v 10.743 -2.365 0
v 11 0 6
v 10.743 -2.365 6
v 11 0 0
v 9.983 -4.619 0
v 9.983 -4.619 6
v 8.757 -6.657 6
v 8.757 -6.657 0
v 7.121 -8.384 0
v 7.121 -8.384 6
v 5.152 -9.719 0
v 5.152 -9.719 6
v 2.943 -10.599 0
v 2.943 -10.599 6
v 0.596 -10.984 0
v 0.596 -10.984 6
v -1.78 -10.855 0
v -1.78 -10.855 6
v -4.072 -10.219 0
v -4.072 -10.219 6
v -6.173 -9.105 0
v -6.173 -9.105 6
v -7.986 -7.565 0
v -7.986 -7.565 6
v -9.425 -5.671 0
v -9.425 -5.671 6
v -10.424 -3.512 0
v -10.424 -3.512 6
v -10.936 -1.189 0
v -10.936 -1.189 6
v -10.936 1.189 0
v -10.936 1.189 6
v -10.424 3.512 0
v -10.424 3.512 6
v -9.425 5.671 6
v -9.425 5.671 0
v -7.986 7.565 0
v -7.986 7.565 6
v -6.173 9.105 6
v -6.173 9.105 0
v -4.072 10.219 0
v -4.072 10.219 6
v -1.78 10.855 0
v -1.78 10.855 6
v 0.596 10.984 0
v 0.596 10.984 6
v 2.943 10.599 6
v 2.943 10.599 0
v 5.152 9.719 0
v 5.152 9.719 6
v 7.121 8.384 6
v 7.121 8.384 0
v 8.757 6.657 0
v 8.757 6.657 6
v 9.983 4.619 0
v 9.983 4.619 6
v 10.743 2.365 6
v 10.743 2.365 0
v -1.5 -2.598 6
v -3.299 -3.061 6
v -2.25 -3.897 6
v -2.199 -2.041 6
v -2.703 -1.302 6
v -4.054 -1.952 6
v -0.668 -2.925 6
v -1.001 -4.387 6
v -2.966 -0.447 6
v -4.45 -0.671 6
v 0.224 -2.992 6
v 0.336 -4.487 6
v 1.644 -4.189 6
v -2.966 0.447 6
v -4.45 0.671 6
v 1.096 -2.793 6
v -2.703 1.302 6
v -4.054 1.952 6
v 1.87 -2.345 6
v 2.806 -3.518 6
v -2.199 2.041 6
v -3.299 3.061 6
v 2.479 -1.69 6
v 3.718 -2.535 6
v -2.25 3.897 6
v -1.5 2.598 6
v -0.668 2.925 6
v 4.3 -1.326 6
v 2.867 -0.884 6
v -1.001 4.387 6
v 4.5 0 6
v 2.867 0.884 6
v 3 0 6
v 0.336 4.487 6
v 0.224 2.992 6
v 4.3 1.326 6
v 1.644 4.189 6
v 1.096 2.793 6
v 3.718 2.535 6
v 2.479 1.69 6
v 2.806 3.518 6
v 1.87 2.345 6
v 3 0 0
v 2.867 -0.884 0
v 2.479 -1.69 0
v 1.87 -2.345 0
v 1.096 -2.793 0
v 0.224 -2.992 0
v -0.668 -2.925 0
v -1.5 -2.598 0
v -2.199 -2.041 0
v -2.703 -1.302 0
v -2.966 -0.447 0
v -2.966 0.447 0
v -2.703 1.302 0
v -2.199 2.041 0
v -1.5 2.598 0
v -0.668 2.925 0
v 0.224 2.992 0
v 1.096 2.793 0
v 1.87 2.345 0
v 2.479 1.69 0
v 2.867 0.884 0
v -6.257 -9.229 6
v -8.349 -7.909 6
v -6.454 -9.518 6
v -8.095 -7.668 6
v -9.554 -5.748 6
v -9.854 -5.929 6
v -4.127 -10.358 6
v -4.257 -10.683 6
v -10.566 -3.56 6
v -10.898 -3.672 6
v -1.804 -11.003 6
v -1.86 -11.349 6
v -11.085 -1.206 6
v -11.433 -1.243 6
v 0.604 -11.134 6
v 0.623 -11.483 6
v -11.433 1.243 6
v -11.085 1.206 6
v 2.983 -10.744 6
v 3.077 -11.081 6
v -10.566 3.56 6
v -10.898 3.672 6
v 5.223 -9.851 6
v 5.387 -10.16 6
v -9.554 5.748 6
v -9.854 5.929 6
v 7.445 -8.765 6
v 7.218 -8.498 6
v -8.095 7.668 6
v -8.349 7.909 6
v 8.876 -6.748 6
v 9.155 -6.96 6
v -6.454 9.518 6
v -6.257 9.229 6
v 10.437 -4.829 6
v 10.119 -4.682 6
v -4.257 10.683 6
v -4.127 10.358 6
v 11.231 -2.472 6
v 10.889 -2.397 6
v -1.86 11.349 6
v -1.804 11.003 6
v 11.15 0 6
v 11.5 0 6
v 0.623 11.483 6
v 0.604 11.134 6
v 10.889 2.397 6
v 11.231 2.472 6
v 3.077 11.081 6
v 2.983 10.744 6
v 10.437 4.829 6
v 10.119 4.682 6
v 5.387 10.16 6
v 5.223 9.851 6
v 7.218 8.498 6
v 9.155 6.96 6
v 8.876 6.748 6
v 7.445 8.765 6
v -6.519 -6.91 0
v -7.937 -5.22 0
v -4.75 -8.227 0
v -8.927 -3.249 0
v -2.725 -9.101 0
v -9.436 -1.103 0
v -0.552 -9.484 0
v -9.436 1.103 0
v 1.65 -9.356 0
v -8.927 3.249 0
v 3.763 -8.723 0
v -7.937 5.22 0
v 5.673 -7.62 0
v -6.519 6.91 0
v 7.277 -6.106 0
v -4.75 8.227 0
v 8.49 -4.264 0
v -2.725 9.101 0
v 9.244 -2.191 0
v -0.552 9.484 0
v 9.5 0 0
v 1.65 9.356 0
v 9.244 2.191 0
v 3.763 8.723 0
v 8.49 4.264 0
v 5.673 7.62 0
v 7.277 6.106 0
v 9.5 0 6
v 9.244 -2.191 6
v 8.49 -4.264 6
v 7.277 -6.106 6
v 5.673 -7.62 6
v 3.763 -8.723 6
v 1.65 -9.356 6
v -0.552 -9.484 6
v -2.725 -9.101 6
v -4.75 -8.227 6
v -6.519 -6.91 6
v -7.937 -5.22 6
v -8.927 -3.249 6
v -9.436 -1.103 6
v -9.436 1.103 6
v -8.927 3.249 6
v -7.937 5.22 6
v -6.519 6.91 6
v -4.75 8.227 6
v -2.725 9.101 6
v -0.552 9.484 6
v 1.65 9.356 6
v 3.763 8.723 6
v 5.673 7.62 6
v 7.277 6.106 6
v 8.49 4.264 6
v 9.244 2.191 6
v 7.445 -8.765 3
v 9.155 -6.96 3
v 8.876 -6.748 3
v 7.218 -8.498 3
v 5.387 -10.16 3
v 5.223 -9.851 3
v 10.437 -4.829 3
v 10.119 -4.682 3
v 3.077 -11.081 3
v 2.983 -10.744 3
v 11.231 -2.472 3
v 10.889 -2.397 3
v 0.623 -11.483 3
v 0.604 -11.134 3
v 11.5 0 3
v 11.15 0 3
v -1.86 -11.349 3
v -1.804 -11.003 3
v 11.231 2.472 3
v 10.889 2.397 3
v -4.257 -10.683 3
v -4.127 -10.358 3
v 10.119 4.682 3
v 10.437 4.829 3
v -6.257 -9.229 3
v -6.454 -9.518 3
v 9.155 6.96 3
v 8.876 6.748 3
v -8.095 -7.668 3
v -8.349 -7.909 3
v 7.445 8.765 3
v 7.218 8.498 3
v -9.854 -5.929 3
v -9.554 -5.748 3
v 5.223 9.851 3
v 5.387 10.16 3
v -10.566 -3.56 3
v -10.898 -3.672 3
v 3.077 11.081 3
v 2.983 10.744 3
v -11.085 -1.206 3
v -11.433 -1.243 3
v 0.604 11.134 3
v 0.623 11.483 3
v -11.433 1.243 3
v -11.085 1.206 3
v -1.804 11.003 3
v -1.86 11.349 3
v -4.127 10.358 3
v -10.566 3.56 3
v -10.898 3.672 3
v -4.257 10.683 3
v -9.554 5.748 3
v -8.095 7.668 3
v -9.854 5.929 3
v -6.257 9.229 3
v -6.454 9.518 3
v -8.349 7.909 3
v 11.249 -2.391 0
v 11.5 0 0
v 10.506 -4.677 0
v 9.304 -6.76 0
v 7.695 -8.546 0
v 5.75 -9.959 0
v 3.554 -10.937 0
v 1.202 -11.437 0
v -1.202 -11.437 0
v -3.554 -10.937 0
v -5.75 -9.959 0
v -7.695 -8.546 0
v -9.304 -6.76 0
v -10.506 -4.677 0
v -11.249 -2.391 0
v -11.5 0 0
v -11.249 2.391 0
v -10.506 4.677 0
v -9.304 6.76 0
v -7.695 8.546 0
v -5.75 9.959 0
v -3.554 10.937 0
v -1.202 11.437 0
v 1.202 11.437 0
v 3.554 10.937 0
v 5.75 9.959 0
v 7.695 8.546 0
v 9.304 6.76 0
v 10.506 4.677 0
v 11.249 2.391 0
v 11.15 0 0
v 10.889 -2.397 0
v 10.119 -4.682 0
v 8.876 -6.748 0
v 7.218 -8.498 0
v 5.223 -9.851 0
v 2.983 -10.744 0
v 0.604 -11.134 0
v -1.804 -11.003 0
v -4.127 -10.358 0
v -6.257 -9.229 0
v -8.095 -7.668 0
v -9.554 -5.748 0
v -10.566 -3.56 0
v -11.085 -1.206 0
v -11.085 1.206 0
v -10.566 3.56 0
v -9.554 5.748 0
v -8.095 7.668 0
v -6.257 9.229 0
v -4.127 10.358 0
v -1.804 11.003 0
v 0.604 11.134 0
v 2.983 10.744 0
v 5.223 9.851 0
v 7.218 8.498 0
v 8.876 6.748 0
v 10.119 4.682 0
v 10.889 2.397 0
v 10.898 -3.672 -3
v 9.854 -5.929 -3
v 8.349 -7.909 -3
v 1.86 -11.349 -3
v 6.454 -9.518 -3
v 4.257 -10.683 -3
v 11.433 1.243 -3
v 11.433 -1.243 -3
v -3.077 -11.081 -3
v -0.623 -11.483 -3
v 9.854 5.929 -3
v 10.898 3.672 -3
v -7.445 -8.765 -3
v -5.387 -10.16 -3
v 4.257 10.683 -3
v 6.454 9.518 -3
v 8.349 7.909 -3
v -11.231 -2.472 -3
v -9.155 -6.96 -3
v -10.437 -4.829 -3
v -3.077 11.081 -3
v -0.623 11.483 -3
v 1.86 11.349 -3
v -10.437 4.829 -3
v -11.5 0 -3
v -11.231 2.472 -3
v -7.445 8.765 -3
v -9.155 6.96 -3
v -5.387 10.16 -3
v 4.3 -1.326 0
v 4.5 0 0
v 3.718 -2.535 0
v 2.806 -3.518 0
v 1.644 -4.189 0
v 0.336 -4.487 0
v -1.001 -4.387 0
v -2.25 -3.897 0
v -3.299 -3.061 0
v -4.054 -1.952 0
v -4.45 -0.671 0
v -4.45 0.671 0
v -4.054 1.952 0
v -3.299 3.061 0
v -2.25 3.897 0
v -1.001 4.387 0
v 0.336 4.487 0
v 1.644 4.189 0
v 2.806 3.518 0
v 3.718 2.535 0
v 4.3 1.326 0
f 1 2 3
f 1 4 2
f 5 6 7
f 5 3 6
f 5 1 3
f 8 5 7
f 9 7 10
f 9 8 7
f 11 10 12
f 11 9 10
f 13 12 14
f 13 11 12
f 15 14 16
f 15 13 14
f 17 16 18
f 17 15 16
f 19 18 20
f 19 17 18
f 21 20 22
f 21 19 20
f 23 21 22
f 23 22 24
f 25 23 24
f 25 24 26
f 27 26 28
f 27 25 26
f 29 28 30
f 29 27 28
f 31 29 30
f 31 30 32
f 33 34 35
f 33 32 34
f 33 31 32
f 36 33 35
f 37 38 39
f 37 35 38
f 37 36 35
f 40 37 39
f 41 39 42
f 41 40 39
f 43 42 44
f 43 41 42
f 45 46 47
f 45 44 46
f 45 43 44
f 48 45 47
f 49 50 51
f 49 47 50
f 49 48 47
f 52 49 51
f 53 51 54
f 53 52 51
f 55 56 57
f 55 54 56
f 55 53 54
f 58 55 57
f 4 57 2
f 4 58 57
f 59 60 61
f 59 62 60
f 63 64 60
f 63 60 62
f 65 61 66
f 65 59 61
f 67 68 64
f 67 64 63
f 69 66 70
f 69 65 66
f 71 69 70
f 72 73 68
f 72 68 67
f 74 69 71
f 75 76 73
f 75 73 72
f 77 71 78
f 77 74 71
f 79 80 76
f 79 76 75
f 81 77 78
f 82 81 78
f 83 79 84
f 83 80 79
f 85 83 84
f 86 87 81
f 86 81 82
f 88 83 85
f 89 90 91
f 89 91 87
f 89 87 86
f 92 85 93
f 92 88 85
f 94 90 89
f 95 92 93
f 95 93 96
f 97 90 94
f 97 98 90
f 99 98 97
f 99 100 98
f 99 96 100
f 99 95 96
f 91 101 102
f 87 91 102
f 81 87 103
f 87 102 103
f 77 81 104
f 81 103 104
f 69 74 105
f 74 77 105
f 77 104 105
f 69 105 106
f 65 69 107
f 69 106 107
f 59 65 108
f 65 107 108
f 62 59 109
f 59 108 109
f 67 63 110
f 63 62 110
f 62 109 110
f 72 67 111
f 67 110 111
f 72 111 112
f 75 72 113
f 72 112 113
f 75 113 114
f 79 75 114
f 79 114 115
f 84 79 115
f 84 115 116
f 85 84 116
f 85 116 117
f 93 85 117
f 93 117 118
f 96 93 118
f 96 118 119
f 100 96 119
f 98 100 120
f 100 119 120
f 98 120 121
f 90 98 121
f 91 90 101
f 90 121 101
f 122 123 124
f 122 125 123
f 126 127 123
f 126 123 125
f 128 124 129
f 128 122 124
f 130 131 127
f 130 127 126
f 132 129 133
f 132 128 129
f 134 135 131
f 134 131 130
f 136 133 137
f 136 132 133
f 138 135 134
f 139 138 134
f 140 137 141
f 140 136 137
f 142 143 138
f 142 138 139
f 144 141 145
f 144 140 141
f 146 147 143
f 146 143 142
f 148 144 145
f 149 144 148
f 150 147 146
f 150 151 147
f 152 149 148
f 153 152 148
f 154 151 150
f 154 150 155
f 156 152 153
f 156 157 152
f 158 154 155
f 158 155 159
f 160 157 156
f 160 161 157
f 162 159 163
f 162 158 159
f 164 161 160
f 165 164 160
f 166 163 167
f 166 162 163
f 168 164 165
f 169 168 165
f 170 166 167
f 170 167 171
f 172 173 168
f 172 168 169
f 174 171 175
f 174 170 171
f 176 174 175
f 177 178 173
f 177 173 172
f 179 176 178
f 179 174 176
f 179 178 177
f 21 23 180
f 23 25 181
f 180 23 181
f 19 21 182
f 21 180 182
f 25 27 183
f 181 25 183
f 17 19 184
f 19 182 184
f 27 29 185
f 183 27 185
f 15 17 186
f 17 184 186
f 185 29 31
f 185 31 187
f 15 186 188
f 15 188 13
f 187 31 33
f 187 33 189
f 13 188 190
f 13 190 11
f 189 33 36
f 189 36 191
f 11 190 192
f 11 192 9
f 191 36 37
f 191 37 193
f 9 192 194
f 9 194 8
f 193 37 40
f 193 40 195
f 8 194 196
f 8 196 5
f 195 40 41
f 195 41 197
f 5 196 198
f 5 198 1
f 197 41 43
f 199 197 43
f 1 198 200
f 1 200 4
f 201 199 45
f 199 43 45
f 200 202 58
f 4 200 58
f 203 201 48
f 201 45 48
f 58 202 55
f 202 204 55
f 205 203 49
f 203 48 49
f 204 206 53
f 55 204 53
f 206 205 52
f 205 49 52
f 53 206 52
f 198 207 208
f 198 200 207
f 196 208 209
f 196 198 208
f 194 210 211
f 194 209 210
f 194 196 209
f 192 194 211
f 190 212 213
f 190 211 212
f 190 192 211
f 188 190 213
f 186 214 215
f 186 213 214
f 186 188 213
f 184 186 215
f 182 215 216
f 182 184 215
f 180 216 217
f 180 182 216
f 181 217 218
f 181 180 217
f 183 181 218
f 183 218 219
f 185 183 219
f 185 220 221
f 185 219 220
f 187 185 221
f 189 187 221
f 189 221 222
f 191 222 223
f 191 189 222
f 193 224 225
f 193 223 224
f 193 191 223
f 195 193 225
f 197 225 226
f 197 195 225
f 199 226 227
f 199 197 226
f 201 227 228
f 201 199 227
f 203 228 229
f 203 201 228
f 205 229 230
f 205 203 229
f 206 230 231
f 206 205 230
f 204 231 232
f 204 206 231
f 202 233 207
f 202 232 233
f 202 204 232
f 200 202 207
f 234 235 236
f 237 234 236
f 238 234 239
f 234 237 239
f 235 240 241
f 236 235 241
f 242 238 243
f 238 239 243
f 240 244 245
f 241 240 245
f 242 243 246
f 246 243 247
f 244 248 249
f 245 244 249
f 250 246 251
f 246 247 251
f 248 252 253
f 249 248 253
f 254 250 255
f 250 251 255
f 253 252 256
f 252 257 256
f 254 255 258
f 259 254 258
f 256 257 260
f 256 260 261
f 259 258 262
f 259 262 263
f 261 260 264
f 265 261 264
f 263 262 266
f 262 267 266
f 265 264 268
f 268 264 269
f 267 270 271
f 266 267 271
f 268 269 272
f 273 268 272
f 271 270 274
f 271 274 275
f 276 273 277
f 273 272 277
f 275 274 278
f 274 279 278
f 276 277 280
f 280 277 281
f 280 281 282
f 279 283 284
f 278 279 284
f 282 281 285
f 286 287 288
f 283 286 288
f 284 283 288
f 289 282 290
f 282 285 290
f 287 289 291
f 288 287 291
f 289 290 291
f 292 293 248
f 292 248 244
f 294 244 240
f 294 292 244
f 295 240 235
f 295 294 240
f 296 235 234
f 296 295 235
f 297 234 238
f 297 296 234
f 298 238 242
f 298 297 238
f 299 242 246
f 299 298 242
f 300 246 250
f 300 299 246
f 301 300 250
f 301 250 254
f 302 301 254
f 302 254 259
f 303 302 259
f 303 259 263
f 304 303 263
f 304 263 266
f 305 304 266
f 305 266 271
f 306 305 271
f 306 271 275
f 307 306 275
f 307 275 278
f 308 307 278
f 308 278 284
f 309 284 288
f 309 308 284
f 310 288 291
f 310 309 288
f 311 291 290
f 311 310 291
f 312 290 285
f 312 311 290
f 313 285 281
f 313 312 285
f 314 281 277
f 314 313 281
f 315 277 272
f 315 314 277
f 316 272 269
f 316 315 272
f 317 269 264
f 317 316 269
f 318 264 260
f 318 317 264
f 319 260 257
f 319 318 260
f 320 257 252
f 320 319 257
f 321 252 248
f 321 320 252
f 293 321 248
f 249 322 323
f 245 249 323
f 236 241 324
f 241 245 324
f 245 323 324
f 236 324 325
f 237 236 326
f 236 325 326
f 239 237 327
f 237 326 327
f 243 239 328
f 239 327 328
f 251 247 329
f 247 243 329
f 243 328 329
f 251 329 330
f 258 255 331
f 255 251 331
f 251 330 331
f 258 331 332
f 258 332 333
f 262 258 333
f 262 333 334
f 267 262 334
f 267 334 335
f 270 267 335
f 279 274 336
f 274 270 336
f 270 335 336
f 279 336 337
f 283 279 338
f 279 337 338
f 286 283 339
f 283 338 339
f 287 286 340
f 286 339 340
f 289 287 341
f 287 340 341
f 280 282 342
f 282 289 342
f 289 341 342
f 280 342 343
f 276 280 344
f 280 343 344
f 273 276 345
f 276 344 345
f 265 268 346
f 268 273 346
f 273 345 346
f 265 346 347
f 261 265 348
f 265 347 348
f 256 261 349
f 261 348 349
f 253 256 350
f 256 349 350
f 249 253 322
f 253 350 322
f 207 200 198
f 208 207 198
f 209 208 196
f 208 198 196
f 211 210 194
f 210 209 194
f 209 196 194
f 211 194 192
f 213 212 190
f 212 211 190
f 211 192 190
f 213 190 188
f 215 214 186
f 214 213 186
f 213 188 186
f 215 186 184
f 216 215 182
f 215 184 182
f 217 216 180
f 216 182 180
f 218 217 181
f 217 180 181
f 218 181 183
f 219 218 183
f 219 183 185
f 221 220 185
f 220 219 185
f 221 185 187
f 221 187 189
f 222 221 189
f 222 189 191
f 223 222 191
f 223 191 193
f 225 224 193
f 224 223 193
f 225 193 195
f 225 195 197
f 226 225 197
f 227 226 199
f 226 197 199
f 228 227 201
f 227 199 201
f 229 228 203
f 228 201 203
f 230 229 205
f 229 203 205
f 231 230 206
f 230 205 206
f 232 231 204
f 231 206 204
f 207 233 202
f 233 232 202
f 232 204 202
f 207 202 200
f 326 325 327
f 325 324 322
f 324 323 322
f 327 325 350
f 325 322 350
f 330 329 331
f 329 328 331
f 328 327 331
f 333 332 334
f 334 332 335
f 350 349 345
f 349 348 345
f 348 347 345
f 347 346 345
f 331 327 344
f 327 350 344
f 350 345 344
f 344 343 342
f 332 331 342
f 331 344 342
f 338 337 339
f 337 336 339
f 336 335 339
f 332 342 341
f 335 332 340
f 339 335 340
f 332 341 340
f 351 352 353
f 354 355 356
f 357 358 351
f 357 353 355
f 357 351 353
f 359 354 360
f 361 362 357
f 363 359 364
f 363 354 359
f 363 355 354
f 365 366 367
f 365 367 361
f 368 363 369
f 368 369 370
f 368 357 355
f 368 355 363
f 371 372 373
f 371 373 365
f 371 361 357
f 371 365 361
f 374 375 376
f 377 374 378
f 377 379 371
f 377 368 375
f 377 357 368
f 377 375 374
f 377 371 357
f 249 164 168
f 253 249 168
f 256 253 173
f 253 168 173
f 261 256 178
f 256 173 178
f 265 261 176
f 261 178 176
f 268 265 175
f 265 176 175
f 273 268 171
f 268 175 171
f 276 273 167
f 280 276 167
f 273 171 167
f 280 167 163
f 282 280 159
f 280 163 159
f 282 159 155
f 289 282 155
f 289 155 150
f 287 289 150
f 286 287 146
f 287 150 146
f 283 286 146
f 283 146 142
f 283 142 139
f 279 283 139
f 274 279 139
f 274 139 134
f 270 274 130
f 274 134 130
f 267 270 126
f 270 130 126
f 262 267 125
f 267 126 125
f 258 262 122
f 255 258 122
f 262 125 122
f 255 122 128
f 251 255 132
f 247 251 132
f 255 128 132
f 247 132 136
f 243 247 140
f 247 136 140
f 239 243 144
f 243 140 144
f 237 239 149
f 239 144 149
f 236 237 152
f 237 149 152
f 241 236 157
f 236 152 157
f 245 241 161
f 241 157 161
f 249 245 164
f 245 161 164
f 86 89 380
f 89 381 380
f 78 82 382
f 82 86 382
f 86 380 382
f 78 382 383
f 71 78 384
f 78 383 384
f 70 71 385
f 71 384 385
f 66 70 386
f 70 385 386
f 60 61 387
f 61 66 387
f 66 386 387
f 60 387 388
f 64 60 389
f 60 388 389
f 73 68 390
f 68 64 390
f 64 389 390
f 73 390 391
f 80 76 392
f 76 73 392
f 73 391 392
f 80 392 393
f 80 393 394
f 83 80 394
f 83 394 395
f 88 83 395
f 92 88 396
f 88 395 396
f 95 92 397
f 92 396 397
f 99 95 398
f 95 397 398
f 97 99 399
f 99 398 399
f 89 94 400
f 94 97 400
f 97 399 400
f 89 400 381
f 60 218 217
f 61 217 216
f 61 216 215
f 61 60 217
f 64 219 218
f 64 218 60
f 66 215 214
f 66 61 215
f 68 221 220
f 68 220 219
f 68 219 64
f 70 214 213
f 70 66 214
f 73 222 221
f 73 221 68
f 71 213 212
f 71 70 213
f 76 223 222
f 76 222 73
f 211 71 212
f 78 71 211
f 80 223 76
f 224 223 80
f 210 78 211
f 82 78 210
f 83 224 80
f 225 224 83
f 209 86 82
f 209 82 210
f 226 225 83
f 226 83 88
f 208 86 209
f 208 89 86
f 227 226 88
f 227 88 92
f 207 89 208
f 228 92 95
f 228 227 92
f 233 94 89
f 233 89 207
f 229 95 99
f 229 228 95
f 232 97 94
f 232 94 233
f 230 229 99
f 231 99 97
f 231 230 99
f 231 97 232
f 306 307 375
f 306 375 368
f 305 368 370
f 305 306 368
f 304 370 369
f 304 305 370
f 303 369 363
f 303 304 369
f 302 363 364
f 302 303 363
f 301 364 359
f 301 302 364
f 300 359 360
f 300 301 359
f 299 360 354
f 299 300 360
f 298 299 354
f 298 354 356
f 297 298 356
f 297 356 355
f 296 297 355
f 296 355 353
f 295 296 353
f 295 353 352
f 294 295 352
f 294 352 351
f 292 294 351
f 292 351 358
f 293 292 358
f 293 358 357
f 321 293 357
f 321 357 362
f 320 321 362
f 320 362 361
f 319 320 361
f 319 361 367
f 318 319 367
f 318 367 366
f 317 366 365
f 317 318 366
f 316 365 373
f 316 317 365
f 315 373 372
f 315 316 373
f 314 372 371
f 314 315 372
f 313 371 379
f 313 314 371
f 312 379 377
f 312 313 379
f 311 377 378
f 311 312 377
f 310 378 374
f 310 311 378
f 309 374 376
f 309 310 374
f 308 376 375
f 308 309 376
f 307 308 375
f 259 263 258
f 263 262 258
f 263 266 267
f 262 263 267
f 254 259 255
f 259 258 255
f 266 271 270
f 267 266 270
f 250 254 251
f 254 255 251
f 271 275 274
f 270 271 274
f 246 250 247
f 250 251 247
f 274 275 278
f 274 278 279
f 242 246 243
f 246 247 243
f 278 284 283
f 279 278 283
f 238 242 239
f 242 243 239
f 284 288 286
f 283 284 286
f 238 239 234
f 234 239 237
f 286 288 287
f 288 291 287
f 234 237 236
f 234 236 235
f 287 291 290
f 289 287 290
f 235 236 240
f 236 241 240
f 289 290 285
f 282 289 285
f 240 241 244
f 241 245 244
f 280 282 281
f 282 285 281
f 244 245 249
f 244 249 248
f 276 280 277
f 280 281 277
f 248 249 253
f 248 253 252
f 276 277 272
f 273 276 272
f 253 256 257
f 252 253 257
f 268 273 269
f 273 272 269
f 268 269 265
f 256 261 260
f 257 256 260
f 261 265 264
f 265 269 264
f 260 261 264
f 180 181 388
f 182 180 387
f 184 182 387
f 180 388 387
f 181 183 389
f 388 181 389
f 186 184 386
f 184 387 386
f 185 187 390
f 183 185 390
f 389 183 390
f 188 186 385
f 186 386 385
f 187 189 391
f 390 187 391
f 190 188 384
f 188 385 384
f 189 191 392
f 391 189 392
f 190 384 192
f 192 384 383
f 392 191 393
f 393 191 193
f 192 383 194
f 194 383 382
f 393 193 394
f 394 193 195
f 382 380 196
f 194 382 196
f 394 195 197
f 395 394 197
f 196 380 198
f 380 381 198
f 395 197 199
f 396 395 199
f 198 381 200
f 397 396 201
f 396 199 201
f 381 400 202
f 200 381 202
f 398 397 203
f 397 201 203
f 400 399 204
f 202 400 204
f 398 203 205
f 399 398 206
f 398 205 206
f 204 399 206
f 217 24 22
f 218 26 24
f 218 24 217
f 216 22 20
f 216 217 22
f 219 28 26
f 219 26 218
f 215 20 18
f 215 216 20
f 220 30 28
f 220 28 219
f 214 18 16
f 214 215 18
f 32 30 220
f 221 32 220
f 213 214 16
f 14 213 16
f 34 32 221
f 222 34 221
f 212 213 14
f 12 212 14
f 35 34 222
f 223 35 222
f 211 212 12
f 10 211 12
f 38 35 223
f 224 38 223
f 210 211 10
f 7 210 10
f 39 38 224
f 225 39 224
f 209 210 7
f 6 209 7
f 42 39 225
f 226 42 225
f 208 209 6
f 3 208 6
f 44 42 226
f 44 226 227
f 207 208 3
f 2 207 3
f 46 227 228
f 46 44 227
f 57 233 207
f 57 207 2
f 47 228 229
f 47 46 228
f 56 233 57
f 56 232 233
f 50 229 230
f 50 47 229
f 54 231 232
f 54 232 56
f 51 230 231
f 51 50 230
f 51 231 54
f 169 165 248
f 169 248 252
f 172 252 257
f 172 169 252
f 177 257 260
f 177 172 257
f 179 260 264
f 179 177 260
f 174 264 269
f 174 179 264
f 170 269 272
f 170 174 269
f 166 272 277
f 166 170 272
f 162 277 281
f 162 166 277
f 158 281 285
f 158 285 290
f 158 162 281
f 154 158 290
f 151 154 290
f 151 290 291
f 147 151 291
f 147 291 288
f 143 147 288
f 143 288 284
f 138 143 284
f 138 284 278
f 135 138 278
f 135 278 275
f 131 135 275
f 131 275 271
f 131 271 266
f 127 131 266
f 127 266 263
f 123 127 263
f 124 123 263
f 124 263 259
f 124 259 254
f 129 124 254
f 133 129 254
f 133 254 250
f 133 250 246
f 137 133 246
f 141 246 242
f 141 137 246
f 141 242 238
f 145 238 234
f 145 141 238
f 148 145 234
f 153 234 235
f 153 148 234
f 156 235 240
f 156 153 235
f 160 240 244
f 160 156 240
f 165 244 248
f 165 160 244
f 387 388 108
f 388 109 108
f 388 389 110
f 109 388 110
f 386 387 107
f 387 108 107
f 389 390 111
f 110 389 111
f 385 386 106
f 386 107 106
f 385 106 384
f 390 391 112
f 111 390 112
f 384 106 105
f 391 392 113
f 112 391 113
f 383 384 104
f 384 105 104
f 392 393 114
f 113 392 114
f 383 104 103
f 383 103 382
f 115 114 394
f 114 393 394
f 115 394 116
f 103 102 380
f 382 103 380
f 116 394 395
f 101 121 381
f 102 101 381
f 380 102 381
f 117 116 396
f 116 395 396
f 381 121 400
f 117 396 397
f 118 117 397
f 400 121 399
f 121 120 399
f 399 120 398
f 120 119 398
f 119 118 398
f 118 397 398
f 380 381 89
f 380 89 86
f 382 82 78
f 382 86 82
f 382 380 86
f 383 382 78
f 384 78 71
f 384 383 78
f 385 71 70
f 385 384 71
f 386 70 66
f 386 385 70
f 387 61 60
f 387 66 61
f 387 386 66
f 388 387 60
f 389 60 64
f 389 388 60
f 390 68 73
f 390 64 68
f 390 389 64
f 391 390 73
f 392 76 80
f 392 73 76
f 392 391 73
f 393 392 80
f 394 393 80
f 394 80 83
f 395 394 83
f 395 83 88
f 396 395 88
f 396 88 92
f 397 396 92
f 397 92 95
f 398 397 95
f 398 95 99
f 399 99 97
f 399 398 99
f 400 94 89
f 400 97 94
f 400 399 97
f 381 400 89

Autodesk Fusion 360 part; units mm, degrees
sketch "Sketch1" plane through (0, 0, 0) normal (0, 0, 1) x (1, 0, 0)
  circle A0 centre (0, 0) radius 3
  circle A1 centre (0, 0) radius 4.5
  circle A2 centre (0, 0) radius 9.5
  circle A3 centre (0, 0) radius 11
  dimension "d1" = 6
  dimension "d2" = 9
  dimension "d3" = 19
  dimension "d4" = 22
extrude "Extrude1" add sketch "Sketch1" along normal blind 6 contours A3 makes body 1
extrude "Extrude2" add sketch "Sketch1" along normal blind 6 separate body contours A2 makes body 2
extrude "Extrude3" add sketch "Sketch1" along normal blind 6 separate body contours A1 makes body 3
sketch "Sketch2" plane through (0, 0, 6) normal (0, 0, 1) x (1, 0, 0)
  circle A0 centre (0, 0) radius 9.5
  circle A1 centre (0, 0) radius 11
  circle A2 centre (0, 0) radius 11.5
  circle A3 centre (0, 0) radius 11.15
  dimension "d11" = 22.3
extrude "Extrude4" add sketch "Sketch2" against normal blind 3 separate body contours A2 makes body 4
ref_plane "WorkPlane1" through (0, 0, 3) normal (0, 0, 1) x (1, 0, 0)
mirror "Mirror1" about plane through (0, 0, 3) normal (0, 0, 1) of "Extrude4" makes body 5
sketch "Sketch3" plane through (0, 0, 0) normal (0, 0, -1) x (-1, 0, 0)
  circle A0 centre (0, 0) radius 11.15
  circle A1 centre (0, 0) radius 11.5
  circle A2 centre (0, 0) radius 11.5
extrude "Extrude5" add sketch "Sketch3" along normal blind 3 separate body contours A0 | A1 A2 makes body 6
combine "Combine1" operation add target body 5 tool bodies 6
sketch "Sketch4" plane through (0, 0, 6) normal (0, 0, 1) x (1, 0, 0)
  circle A0 centre (0, 0) radius 11.15
  circle A1 centre (0, 0) radius 11.5
  line L0 (-4.9572, 10.4939) -> (-5.6603, 11.5434)
  arc A2 (-5.6603, 11.5434) -> (-8.3245, 9.76) centre (-7.015, 10.6854) ccw
  line L1 (-7.588, 8.7179) -> (-8.3245, 9.76)
  arc A3 (-4.9572, 10.4939) -> (-7.616, 8.7574) centre (0, 0) ccw
